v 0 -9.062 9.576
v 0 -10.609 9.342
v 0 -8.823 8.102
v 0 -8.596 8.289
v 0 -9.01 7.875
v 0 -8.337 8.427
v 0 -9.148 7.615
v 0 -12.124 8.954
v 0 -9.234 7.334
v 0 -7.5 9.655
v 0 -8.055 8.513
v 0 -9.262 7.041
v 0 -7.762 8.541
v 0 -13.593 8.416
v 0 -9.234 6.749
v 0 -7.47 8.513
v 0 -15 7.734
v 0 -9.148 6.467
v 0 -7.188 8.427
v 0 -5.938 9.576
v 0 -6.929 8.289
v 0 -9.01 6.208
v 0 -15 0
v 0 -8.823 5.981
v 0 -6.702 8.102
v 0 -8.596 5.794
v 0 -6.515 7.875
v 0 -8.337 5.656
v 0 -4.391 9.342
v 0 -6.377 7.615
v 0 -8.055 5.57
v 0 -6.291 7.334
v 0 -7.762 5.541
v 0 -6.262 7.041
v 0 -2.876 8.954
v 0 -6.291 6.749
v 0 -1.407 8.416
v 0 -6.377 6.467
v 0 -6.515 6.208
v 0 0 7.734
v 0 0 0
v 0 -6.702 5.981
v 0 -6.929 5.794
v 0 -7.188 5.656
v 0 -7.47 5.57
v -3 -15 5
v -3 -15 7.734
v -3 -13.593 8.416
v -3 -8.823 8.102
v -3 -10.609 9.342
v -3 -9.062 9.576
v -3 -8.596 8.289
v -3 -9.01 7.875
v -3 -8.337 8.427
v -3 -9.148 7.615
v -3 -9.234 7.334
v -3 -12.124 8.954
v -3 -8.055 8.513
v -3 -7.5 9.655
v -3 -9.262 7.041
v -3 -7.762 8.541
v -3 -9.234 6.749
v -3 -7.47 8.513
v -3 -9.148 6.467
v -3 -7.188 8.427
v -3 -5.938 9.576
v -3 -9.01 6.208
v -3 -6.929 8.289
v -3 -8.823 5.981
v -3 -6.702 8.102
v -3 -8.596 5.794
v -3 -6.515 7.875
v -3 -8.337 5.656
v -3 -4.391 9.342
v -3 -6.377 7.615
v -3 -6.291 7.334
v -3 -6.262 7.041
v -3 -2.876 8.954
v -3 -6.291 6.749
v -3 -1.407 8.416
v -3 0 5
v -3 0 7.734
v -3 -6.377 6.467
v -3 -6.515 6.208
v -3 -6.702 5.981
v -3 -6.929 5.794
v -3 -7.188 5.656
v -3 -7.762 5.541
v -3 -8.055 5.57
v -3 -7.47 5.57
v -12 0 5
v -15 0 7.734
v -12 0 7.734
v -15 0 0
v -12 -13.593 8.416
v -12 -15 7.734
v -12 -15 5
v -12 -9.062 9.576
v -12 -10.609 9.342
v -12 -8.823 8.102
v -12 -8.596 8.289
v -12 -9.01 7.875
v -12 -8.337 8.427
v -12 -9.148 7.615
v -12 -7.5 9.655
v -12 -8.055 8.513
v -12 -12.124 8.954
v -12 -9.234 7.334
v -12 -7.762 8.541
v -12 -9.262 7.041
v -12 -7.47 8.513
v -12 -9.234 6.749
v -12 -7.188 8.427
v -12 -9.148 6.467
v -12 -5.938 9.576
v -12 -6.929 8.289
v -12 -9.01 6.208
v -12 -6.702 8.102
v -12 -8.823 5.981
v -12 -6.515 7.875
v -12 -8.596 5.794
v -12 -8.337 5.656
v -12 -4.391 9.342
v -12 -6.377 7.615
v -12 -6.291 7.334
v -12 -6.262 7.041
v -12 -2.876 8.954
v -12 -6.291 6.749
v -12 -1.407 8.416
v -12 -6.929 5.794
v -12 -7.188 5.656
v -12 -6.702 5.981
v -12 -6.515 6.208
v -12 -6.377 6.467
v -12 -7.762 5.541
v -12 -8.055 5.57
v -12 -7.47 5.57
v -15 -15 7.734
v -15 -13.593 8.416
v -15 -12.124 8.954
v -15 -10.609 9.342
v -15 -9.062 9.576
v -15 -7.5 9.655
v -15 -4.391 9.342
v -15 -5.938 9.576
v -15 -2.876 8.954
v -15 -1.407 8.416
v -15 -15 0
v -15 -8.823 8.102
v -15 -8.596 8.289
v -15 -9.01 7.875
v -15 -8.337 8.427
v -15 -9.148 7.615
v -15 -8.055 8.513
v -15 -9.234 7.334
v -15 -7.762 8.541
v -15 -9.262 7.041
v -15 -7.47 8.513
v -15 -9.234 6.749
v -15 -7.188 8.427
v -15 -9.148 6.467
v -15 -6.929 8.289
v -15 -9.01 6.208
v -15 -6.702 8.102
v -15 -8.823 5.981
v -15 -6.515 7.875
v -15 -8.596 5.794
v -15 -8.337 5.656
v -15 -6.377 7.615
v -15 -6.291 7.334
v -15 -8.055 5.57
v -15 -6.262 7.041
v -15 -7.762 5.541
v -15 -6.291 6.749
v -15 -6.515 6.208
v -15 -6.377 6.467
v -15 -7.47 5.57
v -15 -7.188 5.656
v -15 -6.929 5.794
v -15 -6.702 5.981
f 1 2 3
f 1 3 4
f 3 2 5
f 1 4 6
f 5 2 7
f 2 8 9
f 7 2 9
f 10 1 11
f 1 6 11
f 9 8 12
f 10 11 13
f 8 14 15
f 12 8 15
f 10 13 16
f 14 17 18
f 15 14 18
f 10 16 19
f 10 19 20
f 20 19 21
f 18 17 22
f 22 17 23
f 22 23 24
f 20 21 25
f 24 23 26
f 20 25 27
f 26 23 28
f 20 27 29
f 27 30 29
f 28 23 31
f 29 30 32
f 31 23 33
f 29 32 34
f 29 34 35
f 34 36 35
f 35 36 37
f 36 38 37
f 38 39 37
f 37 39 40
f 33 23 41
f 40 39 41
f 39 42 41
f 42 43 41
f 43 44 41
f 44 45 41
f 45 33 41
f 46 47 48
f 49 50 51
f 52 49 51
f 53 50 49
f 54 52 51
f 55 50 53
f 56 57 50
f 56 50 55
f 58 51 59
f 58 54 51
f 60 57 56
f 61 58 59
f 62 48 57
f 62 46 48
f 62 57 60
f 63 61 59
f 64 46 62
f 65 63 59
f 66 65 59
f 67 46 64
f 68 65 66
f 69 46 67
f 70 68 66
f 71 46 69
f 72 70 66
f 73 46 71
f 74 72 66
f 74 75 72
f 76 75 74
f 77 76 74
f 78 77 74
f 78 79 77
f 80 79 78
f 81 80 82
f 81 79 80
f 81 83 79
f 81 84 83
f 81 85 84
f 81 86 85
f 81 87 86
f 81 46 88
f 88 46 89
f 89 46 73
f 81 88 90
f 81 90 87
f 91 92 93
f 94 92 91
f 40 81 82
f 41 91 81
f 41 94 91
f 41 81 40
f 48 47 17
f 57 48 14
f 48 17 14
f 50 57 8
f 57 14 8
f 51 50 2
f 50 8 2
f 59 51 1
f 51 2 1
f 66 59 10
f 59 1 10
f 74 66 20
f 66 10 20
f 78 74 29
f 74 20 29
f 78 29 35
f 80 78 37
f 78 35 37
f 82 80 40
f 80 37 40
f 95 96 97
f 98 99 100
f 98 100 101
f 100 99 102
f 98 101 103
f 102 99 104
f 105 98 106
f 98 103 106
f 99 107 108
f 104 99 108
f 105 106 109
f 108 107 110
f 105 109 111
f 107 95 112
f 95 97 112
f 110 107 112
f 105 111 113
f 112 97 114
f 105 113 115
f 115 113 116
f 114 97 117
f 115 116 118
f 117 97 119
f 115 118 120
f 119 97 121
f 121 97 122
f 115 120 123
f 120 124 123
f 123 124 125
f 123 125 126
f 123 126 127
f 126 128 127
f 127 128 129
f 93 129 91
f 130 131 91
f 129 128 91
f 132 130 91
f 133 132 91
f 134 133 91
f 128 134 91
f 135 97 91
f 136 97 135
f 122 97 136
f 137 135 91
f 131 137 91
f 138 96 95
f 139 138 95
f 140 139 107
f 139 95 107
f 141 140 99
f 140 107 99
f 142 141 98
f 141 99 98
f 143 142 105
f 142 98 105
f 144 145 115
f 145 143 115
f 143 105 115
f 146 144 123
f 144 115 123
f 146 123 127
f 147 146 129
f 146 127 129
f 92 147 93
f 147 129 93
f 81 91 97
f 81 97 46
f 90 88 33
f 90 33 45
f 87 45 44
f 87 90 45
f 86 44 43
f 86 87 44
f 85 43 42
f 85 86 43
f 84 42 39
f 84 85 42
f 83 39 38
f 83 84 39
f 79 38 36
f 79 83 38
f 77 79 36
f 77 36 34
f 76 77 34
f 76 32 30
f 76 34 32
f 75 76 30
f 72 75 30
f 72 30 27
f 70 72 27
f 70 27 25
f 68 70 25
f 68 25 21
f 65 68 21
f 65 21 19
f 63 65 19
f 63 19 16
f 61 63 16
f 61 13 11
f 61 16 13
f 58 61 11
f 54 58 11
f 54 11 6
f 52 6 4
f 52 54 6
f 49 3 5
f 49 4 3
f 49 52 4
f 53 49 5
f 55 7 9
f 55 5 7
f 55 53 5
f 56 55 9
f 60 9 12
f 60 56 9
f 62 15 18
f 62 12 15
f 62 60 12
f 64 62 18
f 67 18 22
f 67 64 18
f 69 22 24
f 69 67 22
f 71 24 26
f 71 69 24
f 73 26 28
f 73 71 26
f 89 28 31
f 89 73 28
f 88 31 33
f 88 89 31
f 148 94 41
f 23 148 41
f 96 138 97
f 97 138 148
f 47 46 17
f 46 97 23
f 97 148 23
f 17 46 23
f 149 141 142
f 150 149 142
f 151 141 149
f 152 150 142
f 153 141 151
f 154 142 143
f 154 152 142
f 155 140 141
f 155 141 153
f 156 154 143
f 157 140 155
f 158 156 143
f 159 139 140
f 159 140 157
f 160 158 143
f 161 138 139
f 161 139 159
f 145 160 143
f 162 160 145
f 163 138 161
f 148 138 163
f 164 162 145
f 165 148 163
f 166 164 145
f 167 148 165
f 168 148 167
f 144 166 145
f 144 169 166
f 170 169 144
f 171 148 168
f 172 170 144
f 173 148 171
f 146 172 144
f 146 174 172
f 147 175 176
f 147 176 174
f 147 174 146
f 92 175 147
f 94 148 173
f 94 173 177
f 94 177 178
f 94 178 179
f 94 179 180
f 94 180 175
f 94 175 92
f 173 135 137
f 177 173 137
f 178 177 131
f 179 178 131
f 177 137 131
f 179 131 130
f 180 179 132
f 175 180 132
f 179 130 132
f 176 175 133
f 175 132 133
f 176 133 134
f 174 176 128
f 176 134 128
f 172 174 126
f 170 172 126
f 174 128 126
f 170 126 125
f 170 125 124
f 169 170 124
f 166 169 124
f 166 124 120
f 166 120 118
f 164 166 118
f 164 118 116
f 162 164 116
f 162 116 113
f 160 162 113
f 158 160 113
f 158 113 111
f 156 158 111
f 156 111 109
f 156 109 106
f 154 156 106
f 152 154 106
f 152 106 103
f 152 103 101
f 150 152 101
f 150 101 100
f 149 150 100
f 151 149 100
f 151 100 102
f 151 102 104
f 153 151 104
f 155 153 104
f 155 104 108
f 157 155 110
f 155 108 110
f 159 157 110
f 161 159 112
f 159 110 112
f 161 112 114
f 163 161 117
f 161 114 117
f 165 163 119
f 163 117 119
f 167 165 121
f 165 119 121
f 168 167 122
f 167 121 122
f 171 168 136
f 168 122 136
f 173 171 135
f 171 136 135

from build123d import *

# Parameters (mm, degrees)
SKETCH1_W               = 15
SKETCH1_H               = 15
BOSS_EXTRUDE1_DEPTH     = 5
SKETCH2_W               = 3
SKETCH2_H               = 15
BOSS_EXTRUDE2_DEPTH     = 5
CUT_EXTRUDE1_DEPTH      = 18
SKETCH4_R               = 1.5
CUT_EXTRUDE2_DEPTH      = 13
CUT_EXTRUDE2_DEPTH_BACK = 4


with BuildPart() as part:
    # Sketch1 → Boss-Extrude1 (new body)
    with BuildSketch(Plane.XY):
        with Locations((-7.5, -7.5)):
            Rectangle(SKETCH1_W, SKETCH1_H)
    extrude(amount=BOSS_EXTRUDE1_DEPTH)

    # Sketch2 → Boss-Extrude2 (add)
    with BuildSketch(Plane.XY.offset(5)):
        with Locations((-1.5, -7.5)):
            Rectangle(SKETCH2_W, SKETCH2_H)
        with Locations((-13.5, -7.5)):
            Rectangle(SKETCH2_W, SKETCH2_H)
    extrude(amount=BOSS_EXTRUDE2_DEPTH)

    # Sketch3 → Cut-Extrude1 (cut)
    with BuildSketch(Plane(origin=(0, 0, 0), x_dir=(0, 0, -1), z_dir=(1, 0, 0))):
        with BuildLine():
            Line((-7.733661886, 0), (-10, 0))
            Line((-10, 0), (-10, -15))
            Line((-10, -15), (-7.733661886, -15))
            ThreePointArc((-7.733661886, -15), (-9.654849758, -7.5), (-7.733661886, 0))
        make_face()
    extrude(amount=-CUT_EXTRUDE1_DEPTH, mode=Mode.SUBTRACT)

    # Sketch4 → Cut-Extrude2 (cut, two sides)
    with BuildSketch(Plane(origin=(-12, 0, 0), x_dir=(0, 0, -1), z_dir=(1, 0, 0))) as cut_extrude2_sk:
        with Locations((-7.041389116, -7.762480296)):
            Circle(SKETCH4_R)
    extrude(amount=CUT_EXTRUDE2_DEPTH, mode=Mode.SUBTRACT)
    extrude(cut_extrude2_sk.sketch, amount=-CUT_EXTRUDE2_DEPTH_BACK, mode=Mode.SUBTRACT)


solid = part.part
